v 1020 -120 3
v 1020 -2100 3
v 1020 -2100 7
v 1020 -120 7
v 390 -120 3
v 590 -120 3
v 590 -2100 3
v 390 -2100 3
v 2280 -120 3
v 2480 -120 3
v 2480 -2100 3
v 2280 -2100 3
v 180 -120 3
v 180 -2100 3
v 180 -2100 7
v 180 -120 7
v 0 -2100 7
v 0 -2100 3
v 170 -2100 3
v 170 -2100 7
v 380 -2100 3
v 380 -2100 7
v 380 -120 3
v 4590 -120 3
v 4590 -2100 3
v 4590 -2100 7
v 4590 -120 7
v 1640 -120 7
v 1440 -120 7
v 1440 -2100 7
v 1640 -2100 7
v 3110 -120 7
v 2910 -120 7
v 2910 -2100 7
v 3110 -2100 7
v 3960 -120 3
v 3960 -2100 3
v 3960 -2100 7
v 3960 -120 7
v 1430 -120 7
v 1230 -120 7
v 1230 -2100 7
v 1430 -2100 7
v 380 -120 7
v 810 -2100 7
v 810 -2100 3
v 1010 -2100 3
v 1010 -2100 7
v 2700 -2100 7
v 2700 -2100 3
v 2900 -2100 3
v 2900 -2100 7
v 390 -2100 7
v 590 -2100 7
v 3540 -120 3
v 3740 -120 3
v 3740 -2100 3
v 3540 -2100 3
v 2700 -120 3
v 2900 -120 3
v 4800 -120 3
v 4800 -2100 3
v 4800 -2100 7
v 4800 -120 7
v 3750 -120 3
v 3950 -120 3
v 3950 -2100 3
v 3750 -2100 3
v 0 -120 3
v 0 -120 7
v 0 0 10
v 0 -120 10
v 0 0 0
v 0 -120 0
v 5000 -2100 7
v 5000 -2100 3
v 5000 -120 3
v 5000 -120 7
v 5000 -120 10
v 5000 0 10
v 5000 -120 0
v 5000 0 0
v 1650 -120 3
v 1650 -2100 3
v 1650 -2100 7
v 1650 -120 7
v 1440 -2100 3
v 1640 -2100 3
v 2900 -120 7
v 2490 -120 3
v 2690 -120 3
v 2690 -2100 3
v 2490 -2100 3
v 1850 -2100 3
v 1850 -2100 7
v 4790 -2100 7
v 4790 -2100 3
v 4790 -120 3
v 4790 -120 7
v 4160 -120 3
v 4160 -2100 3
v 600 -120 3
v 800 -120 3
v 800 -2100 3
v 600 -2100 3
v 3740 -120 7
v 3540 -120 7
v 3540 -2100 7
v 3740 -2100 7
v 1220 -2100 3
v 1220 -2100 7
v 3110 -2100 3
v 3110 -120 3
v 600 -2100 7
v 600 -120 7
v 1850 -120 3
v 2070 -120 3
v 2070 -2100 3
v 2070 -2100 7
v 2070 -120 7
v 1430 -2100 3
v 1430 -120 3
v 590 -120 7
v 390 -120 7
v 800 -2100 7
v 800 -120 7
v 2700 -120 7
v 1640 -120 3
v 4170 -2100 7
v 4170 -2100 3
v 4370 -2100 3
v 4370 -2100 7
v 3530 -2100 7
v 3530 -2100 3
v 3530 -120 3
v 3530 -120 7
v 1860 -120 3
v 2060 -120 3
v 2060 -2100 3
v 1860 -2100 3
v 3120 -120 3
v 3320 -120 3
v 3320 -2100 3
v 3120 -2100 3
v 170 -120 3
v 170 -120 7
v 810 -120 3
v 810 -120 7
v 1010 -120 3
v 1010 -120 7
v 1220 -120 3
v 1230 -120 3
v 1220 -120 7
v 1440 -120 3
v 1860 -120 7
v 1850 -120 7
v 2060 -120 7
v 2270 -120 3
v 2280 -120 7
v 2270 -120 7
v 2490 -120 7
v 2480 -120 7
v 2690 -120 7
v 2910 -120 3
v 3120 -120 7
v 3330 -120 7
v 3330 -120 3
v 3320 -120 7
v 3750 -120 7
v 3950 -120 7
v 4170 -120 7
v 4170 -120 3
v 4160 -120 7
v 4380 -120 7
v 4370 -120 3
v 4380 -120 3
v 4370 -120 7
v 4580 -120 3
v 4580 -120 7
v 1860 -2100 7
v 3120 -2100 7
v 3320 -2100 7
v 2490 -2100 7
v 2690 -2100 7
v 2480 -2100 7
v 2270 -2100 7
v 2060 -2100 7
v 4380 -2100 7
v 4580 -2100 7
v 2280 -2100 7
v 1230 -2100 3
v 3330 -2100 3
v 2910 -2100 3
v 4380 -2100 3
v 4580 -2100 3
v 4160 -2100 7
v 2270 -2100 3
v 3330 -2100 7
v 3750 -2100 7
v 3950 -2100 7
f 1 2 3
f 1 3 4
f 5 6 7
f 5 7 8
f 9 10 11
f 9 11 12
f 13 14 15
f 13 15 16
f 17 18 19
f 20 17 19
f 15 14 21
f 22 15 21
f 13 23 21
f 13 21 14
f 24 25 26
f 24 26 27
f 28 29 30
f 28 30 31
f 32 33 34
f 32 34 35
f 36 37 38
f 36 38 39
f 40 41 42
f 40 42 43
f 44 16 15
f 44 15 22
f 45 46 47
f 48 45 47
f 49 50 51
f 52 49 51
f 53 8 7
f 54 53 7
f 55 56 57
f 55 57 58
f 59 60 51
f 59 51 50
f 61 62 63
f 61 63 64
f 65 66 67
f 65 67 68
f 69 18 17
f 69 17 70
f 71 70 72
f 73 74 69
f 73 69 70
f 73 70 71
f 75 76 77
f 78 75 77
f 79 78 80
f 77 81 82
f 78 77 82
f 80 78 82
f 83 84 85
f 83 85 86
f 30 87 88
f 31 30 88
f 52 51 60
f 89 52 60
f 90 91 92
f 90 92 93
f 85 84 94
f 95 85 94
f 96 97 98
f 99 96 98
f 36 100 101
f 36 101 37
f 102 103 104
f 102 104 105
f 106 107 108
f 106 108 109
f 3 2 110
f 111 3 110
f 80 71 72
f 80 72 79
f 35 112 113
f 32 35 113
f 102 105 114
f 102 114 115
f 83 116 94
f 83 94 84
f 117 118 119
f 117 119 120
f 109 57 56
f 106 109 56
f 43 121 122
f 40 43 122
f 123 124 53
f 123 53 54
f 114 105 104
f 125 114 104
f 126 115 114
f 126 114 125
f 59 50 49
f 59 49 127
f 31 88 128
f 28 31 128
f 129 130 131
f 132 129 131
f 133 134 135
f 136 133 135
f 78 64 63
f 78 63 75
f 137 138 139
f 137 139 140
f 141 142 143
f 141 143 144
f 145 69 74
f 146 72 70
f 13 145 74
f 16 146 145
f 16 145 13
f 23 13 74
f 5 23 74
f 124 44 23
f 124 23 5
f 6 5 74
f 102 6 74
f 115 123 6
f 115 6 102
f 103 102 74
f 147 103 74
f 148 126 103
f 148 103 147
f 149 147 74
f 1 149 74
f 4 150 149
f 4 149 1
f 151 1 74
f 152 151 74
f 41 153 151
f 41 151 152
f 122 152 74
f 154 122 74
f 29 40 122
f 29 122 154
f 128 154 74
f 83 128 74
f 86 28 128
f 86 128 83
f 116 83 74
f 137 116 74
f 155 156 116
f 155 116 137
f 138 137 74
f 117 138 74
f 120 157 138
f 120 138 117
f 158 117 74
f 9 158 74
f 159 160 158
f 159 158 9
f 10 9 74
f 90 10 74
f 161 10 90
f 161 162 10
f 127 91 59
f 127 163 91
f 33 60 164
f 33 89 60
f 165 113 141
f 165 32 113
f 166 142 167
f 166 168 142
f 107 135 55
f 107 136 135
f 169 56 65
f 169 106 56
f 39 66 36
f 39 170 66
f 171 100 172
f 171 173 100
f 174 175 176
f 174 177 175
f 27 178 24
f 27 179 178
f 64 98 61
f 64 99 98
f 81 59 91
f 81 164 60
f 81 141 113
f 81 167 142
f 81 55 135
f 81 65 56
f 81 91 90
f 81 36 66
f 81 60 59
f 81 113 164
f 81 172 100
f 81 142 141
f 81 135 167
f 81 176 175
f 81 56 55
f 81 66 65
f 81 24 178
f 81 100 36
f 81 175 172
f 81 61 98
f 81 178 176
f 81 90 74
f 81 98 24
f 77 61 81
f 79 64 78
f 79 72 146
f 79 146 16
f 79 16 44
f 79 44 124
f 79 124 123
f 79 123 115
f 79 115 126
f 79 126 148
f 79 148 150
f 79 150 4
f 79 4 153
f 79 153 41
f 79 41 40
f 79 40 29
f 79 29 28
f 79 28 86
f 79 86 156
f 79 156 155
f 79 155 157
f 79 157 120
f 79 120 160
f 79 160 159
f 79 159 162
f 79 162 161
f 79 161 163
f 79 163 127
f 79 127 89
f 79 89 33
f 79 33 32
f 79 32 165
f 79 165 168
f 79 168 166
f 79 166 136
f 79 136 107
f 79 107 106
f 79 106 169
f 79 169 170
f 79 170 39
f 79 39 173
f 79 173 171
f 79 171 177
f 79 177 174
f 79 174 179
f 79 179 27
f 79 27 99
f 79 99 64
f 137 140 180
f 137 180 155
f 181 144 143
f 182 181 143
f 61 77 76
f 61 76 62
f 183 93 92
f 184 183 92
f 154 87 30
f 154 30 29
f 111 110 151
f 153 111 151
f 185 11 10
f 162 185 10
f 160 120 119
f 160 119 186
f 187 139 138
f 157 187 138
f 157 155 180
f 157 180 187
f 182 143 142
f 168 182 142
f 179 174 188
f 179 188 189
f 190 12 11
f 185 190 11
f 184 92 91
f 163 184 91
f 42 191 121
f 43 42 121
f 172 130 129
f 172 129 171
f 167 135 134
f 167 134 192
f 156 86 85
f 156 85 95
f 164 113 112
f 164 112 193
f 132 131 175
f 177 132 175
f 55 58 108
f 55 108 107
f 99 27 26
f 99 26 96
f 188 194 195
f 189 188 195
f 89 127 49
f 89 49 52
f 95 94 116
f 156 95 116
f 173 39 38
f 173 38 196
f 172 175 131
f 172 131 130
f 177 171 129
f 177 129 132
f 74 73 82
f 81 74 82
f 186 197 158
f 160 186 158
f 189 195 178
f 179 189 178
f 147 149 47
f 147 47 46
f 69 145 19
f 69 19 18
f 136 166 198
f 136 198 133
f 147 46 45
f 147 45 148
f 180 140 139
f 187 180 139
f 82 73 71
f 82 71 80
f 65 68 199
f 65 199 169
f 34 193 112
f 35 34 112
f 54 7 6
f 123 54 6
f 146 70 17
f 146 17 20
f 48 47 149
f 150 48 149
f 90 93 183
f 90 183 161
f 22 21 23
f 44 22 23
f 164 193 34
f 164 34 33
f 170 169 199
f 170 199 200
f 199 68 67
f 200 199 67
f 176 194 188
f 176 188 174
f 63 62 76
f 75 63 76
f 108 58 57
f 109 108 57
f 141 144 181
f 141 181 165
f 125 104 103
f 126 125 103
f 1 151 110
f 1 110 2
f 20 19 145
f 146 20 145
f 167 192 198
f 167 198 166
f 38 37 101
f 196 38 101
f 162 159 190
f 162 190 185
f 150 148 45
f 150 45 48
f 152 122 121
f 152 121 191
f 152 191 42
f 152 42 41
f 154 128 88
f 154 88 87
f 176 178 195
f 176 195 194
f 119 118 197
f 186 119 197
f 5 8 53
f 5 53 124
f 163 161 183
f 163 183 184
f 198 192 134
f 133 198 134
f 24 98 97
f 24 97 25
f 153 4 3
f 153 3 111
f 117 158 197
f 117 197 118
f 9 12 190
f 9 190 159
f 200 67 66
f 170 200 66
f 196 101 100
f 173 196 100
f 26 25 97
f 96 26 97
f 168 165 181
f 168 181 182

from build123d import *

# Parameters (mm, degrees)
CROQUIS1_W              = 5000
CROQUIS1_H              = 2100
SALIENTE_EXTRUIR1_DEPTH = 10
CROQUIS2_W              = 5000
CROQUIS2_H              = 1980
CORTAR_EXTRUIR1_DEPTH   = 3
CROQUIS3_W              = 5000
CROQUIS3_H              = 1980
CORTAR_EXTRUIR2_DEPTH   = 3
CROQUIS4_W              = 10
CROQUIS4_H              = 1980
CORTAR_EXTRUIR3_DEPTH   = 8
MATRIZL1_COUNT          = 23
MATRIZL1_PITCH          = 210


with BuildPart() as part:
    # Croquis1 → Saliente-Extruir1 (new body)
    with BuildSketch(Plane.XY):
        with Locations((2500, -1050)):
            Rectangle(CROQUIS1_W, CROQUIS1_H)
    extrude(amount=SALIENTE_EXTRUIR1_DEPTH)

    # Croquis2 → Cortar-Extruir1 (cut)
    with BuildSketch(Plane.XY.offset(10)):
        with Locations((2500, -1110)):
            Rectangle(CROQUIS2_W, CROQUIS2_H)
    extrude(amount=-CORTAR_EXTRUIR1_DEPTH, mode=Mode.SUBTRACT)

    # Croquis3 → Cortar-Extruir2 (cut)
    with BuildSketch(Plane(origin=(0, 0, 0), x_dir=(-1, 0, 0), z_dir=(0, 0, -1))):
        with Locations((-2500, -1110)):
            Rectangle(CROQUIS3_W, CROQUIS3_H)
    extrude(amount=-CORTAR_EXTRUIR2_DEPTH, mode=Mode.SUBTRACT)

    # Croquis4 → Cortar-Extruir3 (cut)
    with BuildSketch(Plane(origin=(0, 0, 3), x_dir=(-1, 0, 0), z_dir=(0, 0, -1))):
        with Locations((-4795, -1110)):
            Rectangle(CROQUIS4_W, CROQUIS4_H)
    cortar_extruir3 = extrude(amount=-CORTAR_EXTRUIR3_DEPTH, mode=Mode.SUBTRACT)

    # MatrizL1: Cortar-Extruir3 ×23
    with Locations(*[(-i * MATRIZL1_PITCH, 0, 0) for i in range(1, MATRIZL1_COUNT)]):
        add(cortar_extruir3, mode=Mode.SUBTRACT)


solid = part.part
